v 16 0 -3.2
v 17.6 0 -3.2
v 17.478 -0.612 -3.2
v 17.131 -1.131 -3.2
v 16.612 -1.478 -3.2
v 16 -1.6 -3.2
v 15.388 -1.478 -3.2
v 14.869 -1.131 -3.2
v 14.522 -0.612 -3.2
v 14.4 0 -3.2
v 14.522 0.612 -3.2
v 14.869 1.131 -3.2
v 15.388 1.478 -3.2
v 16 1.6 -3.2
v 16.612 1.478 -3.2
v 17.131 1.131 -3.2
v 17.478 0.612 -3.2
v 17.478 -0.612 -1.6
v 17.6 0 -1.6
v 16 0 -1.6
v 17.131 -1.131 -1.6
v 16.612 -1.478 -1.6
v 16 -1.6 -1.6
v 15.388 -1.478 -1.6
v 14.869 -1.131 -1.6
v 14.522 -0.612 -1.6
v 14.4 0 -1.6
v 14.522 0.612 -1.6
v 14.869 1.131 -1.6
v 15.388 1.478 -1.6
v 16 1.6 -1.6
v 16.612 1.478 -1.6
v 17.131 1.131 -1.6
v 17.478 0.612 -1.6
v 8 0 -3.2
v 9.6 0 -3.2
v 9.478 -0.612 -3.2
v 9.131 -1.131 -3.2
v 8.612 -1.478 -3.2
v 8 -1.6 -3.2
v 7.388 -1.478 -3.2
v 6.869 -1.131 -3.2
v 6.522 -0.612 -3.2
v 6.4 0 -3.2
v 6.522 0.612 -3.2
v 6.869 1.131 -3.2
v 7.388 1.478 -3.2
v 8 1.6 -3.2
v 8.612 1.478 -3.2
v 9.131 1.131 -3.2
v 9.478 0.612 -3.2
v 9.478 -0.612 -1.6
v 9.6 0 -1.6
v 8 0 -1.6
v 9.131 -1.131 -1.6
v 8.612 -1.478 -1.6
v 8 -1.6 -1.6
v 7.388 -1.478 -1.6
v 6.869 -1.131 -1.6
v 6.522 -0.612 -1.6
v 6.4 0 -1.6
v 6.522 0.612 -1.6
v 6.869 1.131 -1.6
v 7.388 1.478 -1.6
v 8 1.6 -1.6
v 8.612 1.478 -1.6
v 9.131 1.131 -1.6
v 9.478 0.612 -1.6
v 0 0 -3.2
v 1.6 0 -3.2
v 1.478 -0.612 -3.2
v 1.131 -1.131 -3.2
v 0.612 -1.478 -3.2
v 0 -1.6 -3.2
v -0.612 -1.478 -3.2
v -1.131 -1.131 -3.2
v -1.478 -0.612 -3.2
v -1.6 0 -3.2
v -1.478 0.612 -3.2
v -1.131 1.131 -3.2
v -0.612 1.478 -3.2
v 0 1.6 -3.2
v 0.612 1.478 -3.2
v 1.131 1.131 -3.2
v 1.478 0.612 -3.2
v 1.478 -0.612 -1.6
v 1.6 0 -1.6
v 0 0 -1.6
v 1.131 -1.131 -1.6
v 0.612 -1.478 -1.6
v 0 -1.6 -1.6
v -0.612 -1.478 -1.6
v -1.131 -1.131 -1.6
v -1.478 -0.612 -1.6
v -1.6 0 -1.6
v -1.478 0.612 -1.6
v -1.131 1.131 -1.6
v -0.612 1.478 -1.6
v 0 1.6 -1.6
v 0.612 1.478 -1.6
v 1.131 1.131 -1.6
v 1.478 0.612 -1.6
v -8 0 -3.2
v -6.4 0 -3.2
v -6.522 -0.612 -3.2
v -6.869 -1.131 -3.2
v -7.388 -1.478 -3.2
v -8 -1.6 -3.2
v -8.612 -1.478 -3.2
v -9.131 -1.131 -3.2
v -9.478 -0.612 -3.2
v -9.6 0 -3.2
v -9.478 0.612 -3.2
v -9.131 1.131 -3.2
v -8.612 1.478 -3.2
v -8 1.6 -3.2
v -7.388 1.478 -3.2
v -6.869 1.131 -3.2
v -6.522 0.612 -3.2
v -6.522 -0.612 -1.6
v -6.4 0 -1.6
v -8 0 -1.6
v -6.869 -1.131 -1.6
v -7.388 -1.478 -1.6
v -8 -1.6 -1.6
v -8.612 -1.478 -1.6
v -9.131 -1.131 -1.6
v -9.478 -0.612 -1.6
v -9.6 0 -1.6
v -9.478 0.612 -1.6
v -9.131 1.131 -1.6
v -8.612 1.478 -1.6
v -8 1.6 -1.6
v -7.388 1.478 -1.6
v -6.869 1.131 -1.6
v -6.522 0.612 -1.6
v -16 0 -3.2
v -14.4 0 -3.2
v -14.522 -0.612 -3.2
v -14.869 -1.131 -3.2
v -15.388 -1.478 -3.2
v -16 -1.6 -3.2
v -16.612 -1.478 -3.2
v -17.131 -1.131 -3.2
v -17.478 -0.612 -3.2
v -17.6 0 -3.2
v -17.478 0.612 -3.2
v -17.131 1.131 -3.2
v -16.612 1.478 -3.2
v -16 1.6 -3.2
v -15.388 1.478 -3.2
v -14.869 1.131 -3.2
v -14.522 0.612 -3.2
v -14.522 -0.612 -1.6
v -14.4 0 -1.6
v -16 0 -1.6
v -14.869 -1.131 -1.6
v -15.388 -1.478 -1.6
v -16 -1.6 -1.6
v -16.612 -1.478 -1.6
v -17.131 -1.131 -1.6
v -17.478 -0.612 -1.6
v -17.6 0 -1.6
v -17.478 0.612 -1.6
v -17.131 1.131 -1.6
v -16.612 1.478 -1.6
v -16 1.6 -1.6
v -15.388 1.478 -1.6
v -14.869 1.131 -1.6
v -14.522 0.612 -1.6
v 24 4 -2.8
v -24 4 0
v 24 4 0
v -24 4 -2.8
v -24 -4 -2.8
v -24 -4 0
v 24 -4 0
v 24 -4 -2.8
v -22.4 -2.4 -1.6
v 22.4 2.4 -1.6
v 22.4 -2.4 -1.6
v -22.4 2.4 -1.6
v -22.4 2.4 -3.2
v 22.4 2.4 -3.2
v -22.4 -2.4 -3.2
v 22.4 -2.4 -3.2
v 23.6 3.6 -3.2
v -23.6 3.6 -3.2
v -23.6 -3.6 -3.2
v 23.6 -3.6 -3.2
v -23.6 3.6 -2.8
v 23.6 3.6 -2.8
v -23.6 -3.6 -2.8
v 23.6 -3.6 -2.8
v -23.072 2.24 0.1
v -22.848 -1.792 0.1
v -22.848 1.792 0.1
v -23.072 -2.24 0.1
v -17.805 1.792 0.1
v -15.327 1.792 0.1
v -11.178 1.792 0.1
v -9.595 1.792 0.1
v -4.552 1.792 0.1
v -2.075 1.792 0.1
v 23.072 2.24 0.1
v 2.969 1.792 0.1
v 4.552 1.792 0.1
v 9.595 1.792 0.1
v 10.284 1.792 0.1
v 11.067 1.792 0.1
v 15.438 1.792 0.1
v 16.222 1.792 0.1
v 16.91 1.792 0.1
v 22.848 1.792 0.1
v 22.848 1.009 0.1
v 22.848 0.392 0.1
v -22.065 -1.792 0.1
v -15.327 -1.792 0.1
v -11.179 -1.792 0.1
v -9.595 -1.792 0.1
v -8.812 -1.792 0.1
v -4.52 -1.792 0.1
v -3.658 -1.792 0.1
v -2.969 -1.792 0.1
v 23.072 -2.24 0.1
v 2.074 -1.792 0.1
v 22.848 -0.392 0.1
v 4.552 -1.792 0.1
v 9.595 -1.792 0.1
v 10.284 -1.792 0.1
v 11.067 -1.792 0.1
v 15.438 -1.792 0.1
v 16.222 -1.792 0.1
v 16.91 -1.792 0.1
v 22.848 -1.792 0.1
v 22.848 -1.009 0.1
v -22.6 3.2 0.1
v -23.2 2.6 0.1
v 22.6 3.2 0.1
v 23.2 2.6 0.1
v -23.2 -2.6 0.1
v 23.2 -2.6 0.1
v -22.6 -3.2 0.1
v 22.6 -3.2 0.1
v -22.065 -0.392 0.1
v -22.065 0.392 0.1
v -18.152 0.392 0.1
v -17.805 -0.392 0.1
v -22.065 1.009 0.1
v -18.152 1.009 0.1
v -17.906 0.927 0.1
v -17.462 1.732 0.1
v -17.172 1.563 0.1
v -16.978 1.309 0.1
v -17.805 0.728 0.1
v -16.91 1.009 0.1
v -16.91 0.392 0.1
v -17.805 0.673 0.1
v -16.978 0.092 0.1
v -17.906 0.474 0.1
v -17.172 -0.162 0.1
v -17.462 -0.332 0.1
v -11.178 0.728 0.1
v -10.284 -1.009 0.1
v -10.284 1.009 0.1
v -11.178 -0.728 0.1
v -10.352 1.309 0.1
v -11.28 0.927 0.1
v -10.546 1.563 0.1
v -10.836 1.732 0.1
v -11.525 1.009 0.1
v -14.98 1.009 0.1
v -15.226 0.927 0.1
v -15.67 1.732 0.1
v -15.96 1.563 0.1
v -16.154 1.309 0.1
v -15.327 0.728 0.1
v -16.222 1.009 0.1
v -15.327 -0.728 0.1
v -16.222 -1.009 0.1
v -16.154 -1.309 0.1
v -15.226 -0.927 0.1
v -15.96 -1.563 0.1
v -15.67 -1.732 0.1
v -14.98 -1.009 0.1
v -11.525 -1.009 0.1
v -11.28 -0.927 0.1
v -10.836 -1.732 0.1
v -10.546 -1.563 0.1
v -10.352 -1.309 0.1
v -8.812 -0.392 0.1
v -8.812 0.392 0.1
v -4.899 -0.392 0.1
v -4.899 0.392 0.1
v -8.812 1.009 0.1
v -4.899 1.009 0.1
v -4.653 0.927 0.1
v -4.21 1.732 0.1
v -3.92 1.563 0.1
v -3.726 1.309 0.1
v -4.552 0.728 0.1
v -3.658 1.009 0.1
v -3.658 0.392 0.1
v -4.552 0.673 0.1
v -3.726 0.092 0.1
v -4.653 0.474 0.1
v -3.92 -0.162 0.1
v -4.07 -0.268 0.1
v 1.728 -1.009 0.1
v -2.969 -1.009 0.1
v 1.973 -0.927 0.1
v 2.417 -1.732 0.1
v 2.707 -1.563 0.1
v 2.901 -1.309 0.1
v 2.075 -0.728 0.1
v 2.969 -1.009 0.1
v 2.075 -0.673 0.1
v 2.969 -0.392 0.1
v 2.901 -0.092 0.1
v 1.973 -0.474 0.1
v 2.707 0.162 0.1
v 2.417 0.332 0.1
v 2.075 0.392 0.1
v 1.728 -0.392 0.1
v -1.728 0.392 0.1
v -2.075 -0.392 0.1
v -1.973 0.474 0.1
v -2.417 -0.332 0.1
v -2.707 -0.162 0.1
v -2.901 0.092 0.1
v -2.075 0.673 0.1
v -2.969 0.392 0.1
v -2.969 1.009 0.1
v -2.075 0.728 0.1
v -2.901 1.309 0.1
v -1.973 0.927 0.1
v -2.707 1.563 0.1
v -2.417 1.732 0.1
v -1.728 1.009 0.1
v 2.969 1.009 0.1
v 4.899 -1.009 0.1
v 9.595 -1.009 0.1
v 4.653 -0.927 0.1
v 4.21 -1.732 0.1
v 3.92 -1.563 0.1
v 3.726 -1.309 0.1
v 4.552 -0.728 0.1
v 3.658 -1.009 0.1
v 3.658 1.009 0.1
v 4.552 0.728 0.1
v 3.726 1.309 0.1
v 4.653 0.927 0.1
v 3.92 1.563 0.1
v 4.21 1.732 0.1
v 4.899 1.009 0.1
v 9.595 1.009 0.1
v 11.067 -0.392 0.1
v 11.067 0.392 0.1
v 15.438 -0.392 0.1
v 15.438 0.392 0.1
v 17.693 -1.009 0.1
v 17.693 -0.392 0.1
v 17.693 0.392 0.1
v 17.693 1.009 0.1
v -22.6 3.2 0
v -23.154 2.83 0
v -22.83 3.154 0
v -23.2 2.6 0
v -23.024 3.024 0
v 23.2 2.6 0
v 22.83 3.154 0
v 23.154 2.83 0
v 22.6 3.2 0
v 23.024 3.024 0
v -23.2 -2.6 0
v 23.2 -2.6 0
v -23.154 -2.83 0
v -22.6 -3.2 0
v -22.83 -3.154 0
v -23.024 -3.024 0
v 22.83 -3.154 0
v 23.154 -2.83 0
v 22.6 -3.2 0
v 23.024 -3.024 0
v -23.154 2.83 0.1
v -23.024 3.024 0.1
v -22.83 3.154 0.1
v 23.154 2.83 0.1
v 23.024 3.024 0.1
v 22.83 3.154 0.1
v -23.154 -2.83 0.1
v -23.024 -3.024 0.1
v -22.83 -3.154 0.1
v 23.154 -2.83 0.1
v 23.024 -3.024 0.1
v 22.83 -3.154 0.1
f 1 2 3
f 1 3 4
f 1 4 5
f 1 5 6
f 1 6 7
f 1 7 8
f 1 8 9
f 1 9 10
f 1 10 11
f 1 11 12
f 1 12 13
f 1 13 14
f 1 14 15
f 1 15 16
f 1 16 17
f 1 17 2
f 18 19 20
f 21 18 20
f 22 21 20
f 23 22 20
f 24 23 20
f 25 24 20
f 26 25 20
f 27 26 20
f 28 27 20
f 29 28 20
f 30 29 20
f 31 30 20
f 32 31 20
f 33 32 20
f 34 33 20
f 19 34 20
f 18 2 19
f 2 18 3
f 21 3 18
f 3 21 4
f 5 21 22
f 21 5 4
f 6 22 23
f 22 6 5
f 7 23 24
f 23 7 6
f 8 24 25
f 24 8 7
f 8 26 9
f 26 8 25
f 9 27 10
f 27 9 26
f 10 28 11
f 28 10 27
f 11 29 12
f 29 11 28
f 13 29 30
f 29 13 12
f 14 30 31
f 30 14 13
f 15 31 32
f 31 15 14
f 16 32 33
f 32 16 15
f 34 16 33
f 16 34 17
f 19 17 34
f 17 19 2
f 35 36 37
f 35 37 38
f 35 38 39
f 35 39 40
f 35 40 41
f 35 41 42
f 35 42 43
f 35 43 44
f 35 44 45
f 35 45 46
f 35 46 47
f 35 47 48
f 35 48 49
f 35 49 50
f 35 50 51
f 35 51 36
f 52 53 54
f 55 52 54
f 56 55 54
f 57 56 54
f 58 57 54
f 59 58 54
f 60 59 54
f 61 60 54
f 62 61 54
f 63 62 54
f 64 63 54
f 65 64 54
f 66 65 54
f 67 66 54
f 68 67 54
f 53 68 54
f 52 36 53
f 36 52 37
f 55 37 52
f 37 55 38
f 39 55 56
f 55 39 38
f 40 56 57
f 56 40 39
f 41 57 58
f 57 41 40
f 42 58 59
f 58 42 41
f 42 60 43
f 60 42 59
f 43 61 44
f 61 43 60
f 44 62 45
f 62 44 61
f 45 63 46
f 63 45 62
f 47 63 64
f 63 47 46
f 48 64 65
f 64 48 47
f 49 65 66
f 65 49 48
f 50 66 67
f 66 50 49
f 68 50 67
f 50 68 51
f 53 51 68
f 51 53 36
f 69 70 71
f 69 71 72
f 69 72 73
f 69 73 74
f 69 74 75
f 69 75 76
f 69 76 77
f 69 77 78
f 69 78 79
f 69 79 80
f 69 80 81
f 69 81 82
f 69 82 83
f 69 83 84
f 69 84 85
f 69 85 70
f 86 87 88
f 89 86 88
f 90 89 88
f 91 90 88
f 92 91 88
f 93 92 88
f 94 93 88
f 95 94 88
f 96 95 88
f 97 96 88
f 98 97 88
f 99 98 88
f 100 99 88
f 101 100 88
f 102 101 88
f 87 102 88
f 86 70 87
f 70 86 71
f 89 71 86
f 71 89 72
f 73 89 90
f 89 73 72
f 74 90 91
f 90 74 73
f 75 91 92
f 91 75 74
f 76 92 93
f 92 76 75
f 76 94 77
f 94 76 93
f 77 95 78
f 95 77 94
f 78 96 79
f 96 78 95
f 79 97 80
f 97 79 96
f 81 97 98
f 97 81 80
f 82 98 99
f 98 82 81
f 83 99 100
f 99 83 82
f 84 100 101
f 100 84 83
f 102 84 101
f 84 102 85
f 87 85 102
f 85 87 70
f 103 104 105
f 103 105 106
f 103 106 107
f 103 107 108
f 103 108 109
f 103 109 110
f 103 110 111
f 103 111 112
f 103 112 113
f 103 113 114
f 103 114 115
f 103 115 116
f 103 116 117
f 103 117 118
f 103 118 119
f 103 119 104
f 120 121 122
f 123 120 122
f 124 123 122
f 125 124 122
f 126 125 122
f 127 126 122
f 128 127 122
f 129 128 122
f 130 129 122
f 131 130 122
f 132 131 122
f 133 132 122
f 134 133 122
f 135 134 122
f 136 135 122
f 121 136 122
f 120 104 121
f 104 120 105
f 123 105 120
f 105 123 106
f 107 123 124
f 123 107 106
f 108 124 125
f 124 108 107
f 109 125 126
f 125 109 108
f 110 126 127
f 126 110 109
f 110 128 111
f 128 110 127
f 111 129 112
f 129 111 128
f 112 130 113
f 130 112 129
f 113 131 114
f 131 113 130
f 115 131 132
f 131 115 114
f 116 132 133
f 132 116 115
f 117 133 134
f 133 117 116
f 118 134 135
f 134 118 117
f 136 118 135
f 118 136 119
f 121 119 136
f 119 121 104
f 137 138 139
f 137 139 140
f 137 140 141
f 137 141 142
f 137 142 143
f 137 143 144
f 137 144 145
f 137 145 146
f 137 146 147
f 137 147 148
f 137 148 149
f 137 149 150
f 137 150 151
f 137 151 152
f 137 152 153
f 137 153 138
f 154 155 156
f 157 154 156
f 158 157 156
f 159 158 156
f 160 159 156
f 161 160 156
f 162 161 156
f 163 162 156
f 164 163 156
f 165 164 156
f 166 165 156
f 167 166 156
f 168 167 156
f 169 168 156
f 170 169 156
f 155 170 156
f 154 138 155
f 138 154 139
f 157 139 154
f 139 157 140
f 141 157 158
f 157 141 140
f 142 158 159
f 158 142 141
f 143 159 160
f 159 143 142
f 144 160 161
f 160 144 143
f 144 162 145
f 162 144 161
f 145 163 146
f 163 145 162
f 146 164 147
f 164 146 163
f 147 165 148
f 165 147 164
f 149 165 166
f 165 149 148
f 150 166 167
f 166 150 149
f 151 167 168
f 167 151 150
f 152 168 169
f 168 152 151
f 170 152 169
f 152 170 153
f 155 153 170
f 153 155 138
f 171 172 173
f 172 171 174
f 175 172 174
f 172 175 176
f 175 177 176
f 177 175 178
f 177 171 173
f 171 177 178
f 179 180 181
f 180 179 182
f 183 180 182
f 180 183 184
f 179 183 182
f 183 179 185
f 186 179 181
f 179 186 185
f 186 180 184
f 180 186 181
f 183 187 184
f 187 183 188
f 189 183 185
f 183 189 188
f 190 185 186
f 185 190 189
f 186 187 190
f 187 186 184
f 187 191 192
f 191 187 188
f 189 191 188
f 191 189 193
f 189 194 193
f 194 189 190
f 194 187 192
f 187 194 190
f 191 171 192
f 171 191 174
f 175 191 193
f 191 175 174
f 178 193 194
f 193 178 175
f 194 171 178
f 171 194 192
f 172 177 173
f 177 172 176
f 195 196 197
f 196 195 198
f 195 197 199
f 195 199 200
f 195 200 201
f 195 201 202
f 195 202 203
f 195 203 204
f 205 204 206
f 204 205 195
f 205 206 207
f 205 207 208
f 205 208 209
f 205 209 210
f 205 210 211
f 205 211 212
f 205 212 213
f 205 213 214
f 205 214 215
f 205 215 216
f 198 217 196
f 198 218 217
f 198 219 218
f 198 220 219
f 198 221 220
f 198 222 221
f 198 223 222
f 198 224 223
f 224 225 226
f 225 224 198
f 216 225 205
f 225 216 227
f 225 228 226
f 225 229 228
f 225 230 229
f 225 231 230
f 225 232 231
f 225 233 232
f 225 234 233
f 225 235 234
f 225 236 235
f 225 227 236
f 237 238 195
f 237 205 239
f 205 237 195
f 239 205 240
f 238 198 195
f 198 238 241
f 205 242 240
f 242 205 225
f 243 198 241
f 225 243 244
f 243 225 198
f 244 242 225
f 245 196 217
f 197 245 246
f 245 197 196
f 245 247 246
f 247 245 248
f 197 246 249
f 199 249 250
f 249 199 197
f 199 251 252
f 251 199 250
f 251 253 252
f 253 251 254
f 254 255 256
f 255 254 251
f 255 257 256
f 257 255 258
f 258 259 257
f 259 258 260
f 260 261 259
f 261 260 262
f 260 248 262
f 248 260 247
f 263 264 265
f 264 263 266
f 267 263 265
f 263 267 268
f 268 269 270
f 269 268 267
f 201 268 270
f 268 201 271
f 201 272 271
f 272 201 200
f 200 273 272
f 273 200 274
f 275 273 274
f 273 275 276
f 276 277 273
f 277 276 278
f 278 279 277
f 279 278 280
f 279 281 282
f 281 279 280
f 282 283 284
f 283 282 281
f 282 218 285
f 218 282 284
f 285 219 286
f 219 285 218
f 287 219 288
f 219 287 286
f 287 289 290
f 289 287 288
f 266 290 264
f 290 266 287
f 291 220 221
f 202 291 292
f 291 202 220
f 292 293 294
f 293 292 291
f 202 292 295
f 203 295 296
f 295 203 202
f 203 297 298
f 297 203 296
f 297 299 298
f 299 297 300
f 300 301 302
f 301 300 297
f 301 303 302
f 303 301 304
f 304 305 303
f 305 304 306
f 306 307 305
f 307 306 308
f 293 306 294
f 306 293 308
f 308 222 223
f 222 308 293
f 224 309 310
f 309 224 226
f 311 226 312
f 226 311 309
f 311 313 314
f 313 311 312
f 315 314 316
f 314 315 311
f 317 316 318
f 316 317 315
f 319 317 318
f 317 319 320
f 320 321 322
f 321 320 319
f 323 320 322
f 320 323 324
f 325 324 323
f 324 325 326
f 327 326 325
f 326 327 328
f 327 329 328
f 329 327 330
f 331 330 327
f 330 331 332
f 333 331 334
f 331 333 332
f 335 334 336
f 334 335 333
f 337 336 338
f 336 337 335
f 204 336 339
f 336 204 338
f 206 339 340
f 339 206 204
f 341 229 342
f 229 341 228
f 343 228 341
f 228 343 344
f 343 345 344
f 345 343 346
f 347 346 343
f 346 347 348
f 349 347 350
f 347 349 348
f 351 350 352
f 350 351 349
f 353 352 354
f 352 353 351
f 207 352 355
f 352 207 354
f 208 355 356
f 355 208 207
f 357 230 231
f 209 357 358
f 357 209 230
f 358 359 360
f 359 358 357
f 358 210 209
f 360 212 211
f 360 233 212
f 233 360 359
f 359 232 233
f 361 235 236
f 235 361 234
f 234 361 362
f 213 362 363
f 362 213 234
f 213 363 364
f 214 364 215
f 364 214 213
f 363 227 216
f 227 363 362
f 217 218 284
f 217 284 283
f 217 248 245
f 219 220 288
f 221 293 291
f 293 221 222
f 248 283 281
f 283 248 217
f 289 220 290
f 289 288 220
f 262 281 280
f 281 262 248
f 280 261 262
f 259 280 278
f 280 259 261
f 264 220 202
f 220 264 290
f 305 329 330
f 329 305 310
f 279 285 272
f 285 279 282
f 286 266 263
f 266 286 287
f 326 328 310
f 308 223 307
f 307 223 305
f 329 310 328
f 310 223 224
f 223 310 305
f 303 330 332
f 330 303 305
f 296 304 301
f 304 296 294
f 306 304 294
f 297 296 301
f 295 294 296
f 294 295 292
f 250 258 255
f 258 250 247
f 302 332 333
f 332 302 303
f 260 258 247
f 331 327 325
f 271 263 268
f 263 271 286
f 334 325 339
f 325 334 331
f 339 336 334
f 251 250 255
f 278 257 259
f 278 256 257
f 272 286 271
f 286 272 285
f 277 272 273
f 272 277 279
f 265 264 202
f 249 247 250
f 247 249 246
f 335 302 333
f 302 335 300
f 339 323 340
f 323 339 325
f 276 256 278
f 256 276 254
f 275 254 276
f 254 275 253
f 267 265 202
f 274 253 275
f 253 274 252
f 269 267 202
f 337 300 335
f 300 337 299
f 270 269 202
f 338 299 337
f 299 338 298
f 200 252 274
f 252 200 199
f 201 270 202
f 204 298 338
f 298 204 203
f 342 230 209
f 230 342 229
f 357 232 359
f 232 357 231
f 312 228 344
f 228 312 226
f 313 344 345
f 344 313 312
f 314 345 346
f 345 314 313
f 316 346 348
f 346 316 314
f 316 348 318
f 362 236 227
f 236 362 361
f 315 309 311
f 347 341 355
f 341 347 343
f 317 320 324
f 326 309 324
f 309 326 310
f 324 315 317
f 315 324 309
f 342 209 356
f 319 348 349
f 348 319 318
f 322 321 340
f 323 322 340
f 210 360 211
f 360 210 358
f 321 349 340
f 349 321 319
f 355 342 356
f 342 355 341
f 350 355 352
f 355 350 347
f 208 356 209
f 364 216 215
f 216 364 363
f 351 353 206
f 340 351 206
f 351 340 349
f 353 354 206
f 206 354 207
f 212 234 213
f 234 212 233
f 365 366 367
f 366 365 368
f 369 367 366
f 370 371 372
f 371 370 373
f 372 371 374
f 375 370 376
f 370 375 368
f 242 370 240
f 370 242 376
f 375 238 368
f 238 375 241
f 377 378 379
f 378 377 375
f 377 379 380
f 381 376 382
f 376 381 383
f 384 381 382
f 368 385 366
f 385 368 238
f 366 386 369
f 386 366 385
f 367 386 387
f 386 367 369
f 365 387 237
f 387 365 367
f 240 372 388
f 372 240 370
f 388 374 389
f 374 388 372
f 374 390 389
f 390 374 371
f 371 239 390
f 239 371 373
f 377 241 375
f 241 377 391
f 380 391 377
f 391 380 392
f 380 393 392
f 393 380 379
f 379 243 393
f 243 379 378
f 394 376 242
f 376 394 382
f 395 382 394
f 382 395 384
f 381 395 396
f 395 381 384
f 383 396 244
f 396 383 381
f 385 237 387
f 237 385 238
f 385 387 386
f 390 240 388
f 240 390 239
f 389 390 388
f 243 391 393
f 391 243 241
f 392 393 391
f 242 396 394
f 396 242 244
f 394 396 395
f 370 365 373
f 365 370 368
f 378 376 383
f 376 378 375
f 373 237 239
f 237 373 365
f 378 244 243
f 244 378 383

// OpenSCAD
use <../lib.scad>
use <6148328am.scad>
use <6636.scad>
function ldraw_lib__6636d0d() = [
// 0 Tile  1 x  6 with Red "PORSCHE" on Black Background Sticker
// 0 Name: 6636d0d.dat
// 0 Author: Vincent Messenet [Cheenzo]
// 0 !LDRAW_ORG Shortcut UPDATE 2026-05
// 0 !LICENSE Licensed under CC BY 4.0 : see CAreadme.txt
// 
// 0 BFC CERTIFY CCW
  [0,"BFC","CERTIFY"],
  [0,"BFC","CCW"],
// 
// 0 !CATEGORY Sticker Shortcut
// 
// 0 !KEYWORDS Bricklink 6636pb115, Porsche 919 Hybrid and 917K Pit Lane, set 75876
// 0 !KEYWORDS Speed Champions
// 
// 0 !HISTORY 2026-05-31 [OrionP] Official Update 2026-05
// 
// 1 16 0 0 0 1 0 0 0 1 0 0 0 1 6636.dat
  [1,16,0,0,0,1,0,0,0,1,0,0,0,1, ldraw_lib__6636()],
// 1 16 0 0 0 1 0 0 0 1 0 0 0 1 6148328am.dat
  [1,16,0,0,0,1,0,0,0,1,0,0,0,1, ldraw_lib__6148328am()],
];
module ldraw_lib__6636d0d(step=0, col=false, unit=2/5, alt=false, line=0.2, solid=!$preview)
    makepoly(ldraw_lib__6636d0d(), step=step, col=col, unit=unit, alt=alt, line=line, solid=solid);
ldraw_lib__6636d0d(line=0.2);
